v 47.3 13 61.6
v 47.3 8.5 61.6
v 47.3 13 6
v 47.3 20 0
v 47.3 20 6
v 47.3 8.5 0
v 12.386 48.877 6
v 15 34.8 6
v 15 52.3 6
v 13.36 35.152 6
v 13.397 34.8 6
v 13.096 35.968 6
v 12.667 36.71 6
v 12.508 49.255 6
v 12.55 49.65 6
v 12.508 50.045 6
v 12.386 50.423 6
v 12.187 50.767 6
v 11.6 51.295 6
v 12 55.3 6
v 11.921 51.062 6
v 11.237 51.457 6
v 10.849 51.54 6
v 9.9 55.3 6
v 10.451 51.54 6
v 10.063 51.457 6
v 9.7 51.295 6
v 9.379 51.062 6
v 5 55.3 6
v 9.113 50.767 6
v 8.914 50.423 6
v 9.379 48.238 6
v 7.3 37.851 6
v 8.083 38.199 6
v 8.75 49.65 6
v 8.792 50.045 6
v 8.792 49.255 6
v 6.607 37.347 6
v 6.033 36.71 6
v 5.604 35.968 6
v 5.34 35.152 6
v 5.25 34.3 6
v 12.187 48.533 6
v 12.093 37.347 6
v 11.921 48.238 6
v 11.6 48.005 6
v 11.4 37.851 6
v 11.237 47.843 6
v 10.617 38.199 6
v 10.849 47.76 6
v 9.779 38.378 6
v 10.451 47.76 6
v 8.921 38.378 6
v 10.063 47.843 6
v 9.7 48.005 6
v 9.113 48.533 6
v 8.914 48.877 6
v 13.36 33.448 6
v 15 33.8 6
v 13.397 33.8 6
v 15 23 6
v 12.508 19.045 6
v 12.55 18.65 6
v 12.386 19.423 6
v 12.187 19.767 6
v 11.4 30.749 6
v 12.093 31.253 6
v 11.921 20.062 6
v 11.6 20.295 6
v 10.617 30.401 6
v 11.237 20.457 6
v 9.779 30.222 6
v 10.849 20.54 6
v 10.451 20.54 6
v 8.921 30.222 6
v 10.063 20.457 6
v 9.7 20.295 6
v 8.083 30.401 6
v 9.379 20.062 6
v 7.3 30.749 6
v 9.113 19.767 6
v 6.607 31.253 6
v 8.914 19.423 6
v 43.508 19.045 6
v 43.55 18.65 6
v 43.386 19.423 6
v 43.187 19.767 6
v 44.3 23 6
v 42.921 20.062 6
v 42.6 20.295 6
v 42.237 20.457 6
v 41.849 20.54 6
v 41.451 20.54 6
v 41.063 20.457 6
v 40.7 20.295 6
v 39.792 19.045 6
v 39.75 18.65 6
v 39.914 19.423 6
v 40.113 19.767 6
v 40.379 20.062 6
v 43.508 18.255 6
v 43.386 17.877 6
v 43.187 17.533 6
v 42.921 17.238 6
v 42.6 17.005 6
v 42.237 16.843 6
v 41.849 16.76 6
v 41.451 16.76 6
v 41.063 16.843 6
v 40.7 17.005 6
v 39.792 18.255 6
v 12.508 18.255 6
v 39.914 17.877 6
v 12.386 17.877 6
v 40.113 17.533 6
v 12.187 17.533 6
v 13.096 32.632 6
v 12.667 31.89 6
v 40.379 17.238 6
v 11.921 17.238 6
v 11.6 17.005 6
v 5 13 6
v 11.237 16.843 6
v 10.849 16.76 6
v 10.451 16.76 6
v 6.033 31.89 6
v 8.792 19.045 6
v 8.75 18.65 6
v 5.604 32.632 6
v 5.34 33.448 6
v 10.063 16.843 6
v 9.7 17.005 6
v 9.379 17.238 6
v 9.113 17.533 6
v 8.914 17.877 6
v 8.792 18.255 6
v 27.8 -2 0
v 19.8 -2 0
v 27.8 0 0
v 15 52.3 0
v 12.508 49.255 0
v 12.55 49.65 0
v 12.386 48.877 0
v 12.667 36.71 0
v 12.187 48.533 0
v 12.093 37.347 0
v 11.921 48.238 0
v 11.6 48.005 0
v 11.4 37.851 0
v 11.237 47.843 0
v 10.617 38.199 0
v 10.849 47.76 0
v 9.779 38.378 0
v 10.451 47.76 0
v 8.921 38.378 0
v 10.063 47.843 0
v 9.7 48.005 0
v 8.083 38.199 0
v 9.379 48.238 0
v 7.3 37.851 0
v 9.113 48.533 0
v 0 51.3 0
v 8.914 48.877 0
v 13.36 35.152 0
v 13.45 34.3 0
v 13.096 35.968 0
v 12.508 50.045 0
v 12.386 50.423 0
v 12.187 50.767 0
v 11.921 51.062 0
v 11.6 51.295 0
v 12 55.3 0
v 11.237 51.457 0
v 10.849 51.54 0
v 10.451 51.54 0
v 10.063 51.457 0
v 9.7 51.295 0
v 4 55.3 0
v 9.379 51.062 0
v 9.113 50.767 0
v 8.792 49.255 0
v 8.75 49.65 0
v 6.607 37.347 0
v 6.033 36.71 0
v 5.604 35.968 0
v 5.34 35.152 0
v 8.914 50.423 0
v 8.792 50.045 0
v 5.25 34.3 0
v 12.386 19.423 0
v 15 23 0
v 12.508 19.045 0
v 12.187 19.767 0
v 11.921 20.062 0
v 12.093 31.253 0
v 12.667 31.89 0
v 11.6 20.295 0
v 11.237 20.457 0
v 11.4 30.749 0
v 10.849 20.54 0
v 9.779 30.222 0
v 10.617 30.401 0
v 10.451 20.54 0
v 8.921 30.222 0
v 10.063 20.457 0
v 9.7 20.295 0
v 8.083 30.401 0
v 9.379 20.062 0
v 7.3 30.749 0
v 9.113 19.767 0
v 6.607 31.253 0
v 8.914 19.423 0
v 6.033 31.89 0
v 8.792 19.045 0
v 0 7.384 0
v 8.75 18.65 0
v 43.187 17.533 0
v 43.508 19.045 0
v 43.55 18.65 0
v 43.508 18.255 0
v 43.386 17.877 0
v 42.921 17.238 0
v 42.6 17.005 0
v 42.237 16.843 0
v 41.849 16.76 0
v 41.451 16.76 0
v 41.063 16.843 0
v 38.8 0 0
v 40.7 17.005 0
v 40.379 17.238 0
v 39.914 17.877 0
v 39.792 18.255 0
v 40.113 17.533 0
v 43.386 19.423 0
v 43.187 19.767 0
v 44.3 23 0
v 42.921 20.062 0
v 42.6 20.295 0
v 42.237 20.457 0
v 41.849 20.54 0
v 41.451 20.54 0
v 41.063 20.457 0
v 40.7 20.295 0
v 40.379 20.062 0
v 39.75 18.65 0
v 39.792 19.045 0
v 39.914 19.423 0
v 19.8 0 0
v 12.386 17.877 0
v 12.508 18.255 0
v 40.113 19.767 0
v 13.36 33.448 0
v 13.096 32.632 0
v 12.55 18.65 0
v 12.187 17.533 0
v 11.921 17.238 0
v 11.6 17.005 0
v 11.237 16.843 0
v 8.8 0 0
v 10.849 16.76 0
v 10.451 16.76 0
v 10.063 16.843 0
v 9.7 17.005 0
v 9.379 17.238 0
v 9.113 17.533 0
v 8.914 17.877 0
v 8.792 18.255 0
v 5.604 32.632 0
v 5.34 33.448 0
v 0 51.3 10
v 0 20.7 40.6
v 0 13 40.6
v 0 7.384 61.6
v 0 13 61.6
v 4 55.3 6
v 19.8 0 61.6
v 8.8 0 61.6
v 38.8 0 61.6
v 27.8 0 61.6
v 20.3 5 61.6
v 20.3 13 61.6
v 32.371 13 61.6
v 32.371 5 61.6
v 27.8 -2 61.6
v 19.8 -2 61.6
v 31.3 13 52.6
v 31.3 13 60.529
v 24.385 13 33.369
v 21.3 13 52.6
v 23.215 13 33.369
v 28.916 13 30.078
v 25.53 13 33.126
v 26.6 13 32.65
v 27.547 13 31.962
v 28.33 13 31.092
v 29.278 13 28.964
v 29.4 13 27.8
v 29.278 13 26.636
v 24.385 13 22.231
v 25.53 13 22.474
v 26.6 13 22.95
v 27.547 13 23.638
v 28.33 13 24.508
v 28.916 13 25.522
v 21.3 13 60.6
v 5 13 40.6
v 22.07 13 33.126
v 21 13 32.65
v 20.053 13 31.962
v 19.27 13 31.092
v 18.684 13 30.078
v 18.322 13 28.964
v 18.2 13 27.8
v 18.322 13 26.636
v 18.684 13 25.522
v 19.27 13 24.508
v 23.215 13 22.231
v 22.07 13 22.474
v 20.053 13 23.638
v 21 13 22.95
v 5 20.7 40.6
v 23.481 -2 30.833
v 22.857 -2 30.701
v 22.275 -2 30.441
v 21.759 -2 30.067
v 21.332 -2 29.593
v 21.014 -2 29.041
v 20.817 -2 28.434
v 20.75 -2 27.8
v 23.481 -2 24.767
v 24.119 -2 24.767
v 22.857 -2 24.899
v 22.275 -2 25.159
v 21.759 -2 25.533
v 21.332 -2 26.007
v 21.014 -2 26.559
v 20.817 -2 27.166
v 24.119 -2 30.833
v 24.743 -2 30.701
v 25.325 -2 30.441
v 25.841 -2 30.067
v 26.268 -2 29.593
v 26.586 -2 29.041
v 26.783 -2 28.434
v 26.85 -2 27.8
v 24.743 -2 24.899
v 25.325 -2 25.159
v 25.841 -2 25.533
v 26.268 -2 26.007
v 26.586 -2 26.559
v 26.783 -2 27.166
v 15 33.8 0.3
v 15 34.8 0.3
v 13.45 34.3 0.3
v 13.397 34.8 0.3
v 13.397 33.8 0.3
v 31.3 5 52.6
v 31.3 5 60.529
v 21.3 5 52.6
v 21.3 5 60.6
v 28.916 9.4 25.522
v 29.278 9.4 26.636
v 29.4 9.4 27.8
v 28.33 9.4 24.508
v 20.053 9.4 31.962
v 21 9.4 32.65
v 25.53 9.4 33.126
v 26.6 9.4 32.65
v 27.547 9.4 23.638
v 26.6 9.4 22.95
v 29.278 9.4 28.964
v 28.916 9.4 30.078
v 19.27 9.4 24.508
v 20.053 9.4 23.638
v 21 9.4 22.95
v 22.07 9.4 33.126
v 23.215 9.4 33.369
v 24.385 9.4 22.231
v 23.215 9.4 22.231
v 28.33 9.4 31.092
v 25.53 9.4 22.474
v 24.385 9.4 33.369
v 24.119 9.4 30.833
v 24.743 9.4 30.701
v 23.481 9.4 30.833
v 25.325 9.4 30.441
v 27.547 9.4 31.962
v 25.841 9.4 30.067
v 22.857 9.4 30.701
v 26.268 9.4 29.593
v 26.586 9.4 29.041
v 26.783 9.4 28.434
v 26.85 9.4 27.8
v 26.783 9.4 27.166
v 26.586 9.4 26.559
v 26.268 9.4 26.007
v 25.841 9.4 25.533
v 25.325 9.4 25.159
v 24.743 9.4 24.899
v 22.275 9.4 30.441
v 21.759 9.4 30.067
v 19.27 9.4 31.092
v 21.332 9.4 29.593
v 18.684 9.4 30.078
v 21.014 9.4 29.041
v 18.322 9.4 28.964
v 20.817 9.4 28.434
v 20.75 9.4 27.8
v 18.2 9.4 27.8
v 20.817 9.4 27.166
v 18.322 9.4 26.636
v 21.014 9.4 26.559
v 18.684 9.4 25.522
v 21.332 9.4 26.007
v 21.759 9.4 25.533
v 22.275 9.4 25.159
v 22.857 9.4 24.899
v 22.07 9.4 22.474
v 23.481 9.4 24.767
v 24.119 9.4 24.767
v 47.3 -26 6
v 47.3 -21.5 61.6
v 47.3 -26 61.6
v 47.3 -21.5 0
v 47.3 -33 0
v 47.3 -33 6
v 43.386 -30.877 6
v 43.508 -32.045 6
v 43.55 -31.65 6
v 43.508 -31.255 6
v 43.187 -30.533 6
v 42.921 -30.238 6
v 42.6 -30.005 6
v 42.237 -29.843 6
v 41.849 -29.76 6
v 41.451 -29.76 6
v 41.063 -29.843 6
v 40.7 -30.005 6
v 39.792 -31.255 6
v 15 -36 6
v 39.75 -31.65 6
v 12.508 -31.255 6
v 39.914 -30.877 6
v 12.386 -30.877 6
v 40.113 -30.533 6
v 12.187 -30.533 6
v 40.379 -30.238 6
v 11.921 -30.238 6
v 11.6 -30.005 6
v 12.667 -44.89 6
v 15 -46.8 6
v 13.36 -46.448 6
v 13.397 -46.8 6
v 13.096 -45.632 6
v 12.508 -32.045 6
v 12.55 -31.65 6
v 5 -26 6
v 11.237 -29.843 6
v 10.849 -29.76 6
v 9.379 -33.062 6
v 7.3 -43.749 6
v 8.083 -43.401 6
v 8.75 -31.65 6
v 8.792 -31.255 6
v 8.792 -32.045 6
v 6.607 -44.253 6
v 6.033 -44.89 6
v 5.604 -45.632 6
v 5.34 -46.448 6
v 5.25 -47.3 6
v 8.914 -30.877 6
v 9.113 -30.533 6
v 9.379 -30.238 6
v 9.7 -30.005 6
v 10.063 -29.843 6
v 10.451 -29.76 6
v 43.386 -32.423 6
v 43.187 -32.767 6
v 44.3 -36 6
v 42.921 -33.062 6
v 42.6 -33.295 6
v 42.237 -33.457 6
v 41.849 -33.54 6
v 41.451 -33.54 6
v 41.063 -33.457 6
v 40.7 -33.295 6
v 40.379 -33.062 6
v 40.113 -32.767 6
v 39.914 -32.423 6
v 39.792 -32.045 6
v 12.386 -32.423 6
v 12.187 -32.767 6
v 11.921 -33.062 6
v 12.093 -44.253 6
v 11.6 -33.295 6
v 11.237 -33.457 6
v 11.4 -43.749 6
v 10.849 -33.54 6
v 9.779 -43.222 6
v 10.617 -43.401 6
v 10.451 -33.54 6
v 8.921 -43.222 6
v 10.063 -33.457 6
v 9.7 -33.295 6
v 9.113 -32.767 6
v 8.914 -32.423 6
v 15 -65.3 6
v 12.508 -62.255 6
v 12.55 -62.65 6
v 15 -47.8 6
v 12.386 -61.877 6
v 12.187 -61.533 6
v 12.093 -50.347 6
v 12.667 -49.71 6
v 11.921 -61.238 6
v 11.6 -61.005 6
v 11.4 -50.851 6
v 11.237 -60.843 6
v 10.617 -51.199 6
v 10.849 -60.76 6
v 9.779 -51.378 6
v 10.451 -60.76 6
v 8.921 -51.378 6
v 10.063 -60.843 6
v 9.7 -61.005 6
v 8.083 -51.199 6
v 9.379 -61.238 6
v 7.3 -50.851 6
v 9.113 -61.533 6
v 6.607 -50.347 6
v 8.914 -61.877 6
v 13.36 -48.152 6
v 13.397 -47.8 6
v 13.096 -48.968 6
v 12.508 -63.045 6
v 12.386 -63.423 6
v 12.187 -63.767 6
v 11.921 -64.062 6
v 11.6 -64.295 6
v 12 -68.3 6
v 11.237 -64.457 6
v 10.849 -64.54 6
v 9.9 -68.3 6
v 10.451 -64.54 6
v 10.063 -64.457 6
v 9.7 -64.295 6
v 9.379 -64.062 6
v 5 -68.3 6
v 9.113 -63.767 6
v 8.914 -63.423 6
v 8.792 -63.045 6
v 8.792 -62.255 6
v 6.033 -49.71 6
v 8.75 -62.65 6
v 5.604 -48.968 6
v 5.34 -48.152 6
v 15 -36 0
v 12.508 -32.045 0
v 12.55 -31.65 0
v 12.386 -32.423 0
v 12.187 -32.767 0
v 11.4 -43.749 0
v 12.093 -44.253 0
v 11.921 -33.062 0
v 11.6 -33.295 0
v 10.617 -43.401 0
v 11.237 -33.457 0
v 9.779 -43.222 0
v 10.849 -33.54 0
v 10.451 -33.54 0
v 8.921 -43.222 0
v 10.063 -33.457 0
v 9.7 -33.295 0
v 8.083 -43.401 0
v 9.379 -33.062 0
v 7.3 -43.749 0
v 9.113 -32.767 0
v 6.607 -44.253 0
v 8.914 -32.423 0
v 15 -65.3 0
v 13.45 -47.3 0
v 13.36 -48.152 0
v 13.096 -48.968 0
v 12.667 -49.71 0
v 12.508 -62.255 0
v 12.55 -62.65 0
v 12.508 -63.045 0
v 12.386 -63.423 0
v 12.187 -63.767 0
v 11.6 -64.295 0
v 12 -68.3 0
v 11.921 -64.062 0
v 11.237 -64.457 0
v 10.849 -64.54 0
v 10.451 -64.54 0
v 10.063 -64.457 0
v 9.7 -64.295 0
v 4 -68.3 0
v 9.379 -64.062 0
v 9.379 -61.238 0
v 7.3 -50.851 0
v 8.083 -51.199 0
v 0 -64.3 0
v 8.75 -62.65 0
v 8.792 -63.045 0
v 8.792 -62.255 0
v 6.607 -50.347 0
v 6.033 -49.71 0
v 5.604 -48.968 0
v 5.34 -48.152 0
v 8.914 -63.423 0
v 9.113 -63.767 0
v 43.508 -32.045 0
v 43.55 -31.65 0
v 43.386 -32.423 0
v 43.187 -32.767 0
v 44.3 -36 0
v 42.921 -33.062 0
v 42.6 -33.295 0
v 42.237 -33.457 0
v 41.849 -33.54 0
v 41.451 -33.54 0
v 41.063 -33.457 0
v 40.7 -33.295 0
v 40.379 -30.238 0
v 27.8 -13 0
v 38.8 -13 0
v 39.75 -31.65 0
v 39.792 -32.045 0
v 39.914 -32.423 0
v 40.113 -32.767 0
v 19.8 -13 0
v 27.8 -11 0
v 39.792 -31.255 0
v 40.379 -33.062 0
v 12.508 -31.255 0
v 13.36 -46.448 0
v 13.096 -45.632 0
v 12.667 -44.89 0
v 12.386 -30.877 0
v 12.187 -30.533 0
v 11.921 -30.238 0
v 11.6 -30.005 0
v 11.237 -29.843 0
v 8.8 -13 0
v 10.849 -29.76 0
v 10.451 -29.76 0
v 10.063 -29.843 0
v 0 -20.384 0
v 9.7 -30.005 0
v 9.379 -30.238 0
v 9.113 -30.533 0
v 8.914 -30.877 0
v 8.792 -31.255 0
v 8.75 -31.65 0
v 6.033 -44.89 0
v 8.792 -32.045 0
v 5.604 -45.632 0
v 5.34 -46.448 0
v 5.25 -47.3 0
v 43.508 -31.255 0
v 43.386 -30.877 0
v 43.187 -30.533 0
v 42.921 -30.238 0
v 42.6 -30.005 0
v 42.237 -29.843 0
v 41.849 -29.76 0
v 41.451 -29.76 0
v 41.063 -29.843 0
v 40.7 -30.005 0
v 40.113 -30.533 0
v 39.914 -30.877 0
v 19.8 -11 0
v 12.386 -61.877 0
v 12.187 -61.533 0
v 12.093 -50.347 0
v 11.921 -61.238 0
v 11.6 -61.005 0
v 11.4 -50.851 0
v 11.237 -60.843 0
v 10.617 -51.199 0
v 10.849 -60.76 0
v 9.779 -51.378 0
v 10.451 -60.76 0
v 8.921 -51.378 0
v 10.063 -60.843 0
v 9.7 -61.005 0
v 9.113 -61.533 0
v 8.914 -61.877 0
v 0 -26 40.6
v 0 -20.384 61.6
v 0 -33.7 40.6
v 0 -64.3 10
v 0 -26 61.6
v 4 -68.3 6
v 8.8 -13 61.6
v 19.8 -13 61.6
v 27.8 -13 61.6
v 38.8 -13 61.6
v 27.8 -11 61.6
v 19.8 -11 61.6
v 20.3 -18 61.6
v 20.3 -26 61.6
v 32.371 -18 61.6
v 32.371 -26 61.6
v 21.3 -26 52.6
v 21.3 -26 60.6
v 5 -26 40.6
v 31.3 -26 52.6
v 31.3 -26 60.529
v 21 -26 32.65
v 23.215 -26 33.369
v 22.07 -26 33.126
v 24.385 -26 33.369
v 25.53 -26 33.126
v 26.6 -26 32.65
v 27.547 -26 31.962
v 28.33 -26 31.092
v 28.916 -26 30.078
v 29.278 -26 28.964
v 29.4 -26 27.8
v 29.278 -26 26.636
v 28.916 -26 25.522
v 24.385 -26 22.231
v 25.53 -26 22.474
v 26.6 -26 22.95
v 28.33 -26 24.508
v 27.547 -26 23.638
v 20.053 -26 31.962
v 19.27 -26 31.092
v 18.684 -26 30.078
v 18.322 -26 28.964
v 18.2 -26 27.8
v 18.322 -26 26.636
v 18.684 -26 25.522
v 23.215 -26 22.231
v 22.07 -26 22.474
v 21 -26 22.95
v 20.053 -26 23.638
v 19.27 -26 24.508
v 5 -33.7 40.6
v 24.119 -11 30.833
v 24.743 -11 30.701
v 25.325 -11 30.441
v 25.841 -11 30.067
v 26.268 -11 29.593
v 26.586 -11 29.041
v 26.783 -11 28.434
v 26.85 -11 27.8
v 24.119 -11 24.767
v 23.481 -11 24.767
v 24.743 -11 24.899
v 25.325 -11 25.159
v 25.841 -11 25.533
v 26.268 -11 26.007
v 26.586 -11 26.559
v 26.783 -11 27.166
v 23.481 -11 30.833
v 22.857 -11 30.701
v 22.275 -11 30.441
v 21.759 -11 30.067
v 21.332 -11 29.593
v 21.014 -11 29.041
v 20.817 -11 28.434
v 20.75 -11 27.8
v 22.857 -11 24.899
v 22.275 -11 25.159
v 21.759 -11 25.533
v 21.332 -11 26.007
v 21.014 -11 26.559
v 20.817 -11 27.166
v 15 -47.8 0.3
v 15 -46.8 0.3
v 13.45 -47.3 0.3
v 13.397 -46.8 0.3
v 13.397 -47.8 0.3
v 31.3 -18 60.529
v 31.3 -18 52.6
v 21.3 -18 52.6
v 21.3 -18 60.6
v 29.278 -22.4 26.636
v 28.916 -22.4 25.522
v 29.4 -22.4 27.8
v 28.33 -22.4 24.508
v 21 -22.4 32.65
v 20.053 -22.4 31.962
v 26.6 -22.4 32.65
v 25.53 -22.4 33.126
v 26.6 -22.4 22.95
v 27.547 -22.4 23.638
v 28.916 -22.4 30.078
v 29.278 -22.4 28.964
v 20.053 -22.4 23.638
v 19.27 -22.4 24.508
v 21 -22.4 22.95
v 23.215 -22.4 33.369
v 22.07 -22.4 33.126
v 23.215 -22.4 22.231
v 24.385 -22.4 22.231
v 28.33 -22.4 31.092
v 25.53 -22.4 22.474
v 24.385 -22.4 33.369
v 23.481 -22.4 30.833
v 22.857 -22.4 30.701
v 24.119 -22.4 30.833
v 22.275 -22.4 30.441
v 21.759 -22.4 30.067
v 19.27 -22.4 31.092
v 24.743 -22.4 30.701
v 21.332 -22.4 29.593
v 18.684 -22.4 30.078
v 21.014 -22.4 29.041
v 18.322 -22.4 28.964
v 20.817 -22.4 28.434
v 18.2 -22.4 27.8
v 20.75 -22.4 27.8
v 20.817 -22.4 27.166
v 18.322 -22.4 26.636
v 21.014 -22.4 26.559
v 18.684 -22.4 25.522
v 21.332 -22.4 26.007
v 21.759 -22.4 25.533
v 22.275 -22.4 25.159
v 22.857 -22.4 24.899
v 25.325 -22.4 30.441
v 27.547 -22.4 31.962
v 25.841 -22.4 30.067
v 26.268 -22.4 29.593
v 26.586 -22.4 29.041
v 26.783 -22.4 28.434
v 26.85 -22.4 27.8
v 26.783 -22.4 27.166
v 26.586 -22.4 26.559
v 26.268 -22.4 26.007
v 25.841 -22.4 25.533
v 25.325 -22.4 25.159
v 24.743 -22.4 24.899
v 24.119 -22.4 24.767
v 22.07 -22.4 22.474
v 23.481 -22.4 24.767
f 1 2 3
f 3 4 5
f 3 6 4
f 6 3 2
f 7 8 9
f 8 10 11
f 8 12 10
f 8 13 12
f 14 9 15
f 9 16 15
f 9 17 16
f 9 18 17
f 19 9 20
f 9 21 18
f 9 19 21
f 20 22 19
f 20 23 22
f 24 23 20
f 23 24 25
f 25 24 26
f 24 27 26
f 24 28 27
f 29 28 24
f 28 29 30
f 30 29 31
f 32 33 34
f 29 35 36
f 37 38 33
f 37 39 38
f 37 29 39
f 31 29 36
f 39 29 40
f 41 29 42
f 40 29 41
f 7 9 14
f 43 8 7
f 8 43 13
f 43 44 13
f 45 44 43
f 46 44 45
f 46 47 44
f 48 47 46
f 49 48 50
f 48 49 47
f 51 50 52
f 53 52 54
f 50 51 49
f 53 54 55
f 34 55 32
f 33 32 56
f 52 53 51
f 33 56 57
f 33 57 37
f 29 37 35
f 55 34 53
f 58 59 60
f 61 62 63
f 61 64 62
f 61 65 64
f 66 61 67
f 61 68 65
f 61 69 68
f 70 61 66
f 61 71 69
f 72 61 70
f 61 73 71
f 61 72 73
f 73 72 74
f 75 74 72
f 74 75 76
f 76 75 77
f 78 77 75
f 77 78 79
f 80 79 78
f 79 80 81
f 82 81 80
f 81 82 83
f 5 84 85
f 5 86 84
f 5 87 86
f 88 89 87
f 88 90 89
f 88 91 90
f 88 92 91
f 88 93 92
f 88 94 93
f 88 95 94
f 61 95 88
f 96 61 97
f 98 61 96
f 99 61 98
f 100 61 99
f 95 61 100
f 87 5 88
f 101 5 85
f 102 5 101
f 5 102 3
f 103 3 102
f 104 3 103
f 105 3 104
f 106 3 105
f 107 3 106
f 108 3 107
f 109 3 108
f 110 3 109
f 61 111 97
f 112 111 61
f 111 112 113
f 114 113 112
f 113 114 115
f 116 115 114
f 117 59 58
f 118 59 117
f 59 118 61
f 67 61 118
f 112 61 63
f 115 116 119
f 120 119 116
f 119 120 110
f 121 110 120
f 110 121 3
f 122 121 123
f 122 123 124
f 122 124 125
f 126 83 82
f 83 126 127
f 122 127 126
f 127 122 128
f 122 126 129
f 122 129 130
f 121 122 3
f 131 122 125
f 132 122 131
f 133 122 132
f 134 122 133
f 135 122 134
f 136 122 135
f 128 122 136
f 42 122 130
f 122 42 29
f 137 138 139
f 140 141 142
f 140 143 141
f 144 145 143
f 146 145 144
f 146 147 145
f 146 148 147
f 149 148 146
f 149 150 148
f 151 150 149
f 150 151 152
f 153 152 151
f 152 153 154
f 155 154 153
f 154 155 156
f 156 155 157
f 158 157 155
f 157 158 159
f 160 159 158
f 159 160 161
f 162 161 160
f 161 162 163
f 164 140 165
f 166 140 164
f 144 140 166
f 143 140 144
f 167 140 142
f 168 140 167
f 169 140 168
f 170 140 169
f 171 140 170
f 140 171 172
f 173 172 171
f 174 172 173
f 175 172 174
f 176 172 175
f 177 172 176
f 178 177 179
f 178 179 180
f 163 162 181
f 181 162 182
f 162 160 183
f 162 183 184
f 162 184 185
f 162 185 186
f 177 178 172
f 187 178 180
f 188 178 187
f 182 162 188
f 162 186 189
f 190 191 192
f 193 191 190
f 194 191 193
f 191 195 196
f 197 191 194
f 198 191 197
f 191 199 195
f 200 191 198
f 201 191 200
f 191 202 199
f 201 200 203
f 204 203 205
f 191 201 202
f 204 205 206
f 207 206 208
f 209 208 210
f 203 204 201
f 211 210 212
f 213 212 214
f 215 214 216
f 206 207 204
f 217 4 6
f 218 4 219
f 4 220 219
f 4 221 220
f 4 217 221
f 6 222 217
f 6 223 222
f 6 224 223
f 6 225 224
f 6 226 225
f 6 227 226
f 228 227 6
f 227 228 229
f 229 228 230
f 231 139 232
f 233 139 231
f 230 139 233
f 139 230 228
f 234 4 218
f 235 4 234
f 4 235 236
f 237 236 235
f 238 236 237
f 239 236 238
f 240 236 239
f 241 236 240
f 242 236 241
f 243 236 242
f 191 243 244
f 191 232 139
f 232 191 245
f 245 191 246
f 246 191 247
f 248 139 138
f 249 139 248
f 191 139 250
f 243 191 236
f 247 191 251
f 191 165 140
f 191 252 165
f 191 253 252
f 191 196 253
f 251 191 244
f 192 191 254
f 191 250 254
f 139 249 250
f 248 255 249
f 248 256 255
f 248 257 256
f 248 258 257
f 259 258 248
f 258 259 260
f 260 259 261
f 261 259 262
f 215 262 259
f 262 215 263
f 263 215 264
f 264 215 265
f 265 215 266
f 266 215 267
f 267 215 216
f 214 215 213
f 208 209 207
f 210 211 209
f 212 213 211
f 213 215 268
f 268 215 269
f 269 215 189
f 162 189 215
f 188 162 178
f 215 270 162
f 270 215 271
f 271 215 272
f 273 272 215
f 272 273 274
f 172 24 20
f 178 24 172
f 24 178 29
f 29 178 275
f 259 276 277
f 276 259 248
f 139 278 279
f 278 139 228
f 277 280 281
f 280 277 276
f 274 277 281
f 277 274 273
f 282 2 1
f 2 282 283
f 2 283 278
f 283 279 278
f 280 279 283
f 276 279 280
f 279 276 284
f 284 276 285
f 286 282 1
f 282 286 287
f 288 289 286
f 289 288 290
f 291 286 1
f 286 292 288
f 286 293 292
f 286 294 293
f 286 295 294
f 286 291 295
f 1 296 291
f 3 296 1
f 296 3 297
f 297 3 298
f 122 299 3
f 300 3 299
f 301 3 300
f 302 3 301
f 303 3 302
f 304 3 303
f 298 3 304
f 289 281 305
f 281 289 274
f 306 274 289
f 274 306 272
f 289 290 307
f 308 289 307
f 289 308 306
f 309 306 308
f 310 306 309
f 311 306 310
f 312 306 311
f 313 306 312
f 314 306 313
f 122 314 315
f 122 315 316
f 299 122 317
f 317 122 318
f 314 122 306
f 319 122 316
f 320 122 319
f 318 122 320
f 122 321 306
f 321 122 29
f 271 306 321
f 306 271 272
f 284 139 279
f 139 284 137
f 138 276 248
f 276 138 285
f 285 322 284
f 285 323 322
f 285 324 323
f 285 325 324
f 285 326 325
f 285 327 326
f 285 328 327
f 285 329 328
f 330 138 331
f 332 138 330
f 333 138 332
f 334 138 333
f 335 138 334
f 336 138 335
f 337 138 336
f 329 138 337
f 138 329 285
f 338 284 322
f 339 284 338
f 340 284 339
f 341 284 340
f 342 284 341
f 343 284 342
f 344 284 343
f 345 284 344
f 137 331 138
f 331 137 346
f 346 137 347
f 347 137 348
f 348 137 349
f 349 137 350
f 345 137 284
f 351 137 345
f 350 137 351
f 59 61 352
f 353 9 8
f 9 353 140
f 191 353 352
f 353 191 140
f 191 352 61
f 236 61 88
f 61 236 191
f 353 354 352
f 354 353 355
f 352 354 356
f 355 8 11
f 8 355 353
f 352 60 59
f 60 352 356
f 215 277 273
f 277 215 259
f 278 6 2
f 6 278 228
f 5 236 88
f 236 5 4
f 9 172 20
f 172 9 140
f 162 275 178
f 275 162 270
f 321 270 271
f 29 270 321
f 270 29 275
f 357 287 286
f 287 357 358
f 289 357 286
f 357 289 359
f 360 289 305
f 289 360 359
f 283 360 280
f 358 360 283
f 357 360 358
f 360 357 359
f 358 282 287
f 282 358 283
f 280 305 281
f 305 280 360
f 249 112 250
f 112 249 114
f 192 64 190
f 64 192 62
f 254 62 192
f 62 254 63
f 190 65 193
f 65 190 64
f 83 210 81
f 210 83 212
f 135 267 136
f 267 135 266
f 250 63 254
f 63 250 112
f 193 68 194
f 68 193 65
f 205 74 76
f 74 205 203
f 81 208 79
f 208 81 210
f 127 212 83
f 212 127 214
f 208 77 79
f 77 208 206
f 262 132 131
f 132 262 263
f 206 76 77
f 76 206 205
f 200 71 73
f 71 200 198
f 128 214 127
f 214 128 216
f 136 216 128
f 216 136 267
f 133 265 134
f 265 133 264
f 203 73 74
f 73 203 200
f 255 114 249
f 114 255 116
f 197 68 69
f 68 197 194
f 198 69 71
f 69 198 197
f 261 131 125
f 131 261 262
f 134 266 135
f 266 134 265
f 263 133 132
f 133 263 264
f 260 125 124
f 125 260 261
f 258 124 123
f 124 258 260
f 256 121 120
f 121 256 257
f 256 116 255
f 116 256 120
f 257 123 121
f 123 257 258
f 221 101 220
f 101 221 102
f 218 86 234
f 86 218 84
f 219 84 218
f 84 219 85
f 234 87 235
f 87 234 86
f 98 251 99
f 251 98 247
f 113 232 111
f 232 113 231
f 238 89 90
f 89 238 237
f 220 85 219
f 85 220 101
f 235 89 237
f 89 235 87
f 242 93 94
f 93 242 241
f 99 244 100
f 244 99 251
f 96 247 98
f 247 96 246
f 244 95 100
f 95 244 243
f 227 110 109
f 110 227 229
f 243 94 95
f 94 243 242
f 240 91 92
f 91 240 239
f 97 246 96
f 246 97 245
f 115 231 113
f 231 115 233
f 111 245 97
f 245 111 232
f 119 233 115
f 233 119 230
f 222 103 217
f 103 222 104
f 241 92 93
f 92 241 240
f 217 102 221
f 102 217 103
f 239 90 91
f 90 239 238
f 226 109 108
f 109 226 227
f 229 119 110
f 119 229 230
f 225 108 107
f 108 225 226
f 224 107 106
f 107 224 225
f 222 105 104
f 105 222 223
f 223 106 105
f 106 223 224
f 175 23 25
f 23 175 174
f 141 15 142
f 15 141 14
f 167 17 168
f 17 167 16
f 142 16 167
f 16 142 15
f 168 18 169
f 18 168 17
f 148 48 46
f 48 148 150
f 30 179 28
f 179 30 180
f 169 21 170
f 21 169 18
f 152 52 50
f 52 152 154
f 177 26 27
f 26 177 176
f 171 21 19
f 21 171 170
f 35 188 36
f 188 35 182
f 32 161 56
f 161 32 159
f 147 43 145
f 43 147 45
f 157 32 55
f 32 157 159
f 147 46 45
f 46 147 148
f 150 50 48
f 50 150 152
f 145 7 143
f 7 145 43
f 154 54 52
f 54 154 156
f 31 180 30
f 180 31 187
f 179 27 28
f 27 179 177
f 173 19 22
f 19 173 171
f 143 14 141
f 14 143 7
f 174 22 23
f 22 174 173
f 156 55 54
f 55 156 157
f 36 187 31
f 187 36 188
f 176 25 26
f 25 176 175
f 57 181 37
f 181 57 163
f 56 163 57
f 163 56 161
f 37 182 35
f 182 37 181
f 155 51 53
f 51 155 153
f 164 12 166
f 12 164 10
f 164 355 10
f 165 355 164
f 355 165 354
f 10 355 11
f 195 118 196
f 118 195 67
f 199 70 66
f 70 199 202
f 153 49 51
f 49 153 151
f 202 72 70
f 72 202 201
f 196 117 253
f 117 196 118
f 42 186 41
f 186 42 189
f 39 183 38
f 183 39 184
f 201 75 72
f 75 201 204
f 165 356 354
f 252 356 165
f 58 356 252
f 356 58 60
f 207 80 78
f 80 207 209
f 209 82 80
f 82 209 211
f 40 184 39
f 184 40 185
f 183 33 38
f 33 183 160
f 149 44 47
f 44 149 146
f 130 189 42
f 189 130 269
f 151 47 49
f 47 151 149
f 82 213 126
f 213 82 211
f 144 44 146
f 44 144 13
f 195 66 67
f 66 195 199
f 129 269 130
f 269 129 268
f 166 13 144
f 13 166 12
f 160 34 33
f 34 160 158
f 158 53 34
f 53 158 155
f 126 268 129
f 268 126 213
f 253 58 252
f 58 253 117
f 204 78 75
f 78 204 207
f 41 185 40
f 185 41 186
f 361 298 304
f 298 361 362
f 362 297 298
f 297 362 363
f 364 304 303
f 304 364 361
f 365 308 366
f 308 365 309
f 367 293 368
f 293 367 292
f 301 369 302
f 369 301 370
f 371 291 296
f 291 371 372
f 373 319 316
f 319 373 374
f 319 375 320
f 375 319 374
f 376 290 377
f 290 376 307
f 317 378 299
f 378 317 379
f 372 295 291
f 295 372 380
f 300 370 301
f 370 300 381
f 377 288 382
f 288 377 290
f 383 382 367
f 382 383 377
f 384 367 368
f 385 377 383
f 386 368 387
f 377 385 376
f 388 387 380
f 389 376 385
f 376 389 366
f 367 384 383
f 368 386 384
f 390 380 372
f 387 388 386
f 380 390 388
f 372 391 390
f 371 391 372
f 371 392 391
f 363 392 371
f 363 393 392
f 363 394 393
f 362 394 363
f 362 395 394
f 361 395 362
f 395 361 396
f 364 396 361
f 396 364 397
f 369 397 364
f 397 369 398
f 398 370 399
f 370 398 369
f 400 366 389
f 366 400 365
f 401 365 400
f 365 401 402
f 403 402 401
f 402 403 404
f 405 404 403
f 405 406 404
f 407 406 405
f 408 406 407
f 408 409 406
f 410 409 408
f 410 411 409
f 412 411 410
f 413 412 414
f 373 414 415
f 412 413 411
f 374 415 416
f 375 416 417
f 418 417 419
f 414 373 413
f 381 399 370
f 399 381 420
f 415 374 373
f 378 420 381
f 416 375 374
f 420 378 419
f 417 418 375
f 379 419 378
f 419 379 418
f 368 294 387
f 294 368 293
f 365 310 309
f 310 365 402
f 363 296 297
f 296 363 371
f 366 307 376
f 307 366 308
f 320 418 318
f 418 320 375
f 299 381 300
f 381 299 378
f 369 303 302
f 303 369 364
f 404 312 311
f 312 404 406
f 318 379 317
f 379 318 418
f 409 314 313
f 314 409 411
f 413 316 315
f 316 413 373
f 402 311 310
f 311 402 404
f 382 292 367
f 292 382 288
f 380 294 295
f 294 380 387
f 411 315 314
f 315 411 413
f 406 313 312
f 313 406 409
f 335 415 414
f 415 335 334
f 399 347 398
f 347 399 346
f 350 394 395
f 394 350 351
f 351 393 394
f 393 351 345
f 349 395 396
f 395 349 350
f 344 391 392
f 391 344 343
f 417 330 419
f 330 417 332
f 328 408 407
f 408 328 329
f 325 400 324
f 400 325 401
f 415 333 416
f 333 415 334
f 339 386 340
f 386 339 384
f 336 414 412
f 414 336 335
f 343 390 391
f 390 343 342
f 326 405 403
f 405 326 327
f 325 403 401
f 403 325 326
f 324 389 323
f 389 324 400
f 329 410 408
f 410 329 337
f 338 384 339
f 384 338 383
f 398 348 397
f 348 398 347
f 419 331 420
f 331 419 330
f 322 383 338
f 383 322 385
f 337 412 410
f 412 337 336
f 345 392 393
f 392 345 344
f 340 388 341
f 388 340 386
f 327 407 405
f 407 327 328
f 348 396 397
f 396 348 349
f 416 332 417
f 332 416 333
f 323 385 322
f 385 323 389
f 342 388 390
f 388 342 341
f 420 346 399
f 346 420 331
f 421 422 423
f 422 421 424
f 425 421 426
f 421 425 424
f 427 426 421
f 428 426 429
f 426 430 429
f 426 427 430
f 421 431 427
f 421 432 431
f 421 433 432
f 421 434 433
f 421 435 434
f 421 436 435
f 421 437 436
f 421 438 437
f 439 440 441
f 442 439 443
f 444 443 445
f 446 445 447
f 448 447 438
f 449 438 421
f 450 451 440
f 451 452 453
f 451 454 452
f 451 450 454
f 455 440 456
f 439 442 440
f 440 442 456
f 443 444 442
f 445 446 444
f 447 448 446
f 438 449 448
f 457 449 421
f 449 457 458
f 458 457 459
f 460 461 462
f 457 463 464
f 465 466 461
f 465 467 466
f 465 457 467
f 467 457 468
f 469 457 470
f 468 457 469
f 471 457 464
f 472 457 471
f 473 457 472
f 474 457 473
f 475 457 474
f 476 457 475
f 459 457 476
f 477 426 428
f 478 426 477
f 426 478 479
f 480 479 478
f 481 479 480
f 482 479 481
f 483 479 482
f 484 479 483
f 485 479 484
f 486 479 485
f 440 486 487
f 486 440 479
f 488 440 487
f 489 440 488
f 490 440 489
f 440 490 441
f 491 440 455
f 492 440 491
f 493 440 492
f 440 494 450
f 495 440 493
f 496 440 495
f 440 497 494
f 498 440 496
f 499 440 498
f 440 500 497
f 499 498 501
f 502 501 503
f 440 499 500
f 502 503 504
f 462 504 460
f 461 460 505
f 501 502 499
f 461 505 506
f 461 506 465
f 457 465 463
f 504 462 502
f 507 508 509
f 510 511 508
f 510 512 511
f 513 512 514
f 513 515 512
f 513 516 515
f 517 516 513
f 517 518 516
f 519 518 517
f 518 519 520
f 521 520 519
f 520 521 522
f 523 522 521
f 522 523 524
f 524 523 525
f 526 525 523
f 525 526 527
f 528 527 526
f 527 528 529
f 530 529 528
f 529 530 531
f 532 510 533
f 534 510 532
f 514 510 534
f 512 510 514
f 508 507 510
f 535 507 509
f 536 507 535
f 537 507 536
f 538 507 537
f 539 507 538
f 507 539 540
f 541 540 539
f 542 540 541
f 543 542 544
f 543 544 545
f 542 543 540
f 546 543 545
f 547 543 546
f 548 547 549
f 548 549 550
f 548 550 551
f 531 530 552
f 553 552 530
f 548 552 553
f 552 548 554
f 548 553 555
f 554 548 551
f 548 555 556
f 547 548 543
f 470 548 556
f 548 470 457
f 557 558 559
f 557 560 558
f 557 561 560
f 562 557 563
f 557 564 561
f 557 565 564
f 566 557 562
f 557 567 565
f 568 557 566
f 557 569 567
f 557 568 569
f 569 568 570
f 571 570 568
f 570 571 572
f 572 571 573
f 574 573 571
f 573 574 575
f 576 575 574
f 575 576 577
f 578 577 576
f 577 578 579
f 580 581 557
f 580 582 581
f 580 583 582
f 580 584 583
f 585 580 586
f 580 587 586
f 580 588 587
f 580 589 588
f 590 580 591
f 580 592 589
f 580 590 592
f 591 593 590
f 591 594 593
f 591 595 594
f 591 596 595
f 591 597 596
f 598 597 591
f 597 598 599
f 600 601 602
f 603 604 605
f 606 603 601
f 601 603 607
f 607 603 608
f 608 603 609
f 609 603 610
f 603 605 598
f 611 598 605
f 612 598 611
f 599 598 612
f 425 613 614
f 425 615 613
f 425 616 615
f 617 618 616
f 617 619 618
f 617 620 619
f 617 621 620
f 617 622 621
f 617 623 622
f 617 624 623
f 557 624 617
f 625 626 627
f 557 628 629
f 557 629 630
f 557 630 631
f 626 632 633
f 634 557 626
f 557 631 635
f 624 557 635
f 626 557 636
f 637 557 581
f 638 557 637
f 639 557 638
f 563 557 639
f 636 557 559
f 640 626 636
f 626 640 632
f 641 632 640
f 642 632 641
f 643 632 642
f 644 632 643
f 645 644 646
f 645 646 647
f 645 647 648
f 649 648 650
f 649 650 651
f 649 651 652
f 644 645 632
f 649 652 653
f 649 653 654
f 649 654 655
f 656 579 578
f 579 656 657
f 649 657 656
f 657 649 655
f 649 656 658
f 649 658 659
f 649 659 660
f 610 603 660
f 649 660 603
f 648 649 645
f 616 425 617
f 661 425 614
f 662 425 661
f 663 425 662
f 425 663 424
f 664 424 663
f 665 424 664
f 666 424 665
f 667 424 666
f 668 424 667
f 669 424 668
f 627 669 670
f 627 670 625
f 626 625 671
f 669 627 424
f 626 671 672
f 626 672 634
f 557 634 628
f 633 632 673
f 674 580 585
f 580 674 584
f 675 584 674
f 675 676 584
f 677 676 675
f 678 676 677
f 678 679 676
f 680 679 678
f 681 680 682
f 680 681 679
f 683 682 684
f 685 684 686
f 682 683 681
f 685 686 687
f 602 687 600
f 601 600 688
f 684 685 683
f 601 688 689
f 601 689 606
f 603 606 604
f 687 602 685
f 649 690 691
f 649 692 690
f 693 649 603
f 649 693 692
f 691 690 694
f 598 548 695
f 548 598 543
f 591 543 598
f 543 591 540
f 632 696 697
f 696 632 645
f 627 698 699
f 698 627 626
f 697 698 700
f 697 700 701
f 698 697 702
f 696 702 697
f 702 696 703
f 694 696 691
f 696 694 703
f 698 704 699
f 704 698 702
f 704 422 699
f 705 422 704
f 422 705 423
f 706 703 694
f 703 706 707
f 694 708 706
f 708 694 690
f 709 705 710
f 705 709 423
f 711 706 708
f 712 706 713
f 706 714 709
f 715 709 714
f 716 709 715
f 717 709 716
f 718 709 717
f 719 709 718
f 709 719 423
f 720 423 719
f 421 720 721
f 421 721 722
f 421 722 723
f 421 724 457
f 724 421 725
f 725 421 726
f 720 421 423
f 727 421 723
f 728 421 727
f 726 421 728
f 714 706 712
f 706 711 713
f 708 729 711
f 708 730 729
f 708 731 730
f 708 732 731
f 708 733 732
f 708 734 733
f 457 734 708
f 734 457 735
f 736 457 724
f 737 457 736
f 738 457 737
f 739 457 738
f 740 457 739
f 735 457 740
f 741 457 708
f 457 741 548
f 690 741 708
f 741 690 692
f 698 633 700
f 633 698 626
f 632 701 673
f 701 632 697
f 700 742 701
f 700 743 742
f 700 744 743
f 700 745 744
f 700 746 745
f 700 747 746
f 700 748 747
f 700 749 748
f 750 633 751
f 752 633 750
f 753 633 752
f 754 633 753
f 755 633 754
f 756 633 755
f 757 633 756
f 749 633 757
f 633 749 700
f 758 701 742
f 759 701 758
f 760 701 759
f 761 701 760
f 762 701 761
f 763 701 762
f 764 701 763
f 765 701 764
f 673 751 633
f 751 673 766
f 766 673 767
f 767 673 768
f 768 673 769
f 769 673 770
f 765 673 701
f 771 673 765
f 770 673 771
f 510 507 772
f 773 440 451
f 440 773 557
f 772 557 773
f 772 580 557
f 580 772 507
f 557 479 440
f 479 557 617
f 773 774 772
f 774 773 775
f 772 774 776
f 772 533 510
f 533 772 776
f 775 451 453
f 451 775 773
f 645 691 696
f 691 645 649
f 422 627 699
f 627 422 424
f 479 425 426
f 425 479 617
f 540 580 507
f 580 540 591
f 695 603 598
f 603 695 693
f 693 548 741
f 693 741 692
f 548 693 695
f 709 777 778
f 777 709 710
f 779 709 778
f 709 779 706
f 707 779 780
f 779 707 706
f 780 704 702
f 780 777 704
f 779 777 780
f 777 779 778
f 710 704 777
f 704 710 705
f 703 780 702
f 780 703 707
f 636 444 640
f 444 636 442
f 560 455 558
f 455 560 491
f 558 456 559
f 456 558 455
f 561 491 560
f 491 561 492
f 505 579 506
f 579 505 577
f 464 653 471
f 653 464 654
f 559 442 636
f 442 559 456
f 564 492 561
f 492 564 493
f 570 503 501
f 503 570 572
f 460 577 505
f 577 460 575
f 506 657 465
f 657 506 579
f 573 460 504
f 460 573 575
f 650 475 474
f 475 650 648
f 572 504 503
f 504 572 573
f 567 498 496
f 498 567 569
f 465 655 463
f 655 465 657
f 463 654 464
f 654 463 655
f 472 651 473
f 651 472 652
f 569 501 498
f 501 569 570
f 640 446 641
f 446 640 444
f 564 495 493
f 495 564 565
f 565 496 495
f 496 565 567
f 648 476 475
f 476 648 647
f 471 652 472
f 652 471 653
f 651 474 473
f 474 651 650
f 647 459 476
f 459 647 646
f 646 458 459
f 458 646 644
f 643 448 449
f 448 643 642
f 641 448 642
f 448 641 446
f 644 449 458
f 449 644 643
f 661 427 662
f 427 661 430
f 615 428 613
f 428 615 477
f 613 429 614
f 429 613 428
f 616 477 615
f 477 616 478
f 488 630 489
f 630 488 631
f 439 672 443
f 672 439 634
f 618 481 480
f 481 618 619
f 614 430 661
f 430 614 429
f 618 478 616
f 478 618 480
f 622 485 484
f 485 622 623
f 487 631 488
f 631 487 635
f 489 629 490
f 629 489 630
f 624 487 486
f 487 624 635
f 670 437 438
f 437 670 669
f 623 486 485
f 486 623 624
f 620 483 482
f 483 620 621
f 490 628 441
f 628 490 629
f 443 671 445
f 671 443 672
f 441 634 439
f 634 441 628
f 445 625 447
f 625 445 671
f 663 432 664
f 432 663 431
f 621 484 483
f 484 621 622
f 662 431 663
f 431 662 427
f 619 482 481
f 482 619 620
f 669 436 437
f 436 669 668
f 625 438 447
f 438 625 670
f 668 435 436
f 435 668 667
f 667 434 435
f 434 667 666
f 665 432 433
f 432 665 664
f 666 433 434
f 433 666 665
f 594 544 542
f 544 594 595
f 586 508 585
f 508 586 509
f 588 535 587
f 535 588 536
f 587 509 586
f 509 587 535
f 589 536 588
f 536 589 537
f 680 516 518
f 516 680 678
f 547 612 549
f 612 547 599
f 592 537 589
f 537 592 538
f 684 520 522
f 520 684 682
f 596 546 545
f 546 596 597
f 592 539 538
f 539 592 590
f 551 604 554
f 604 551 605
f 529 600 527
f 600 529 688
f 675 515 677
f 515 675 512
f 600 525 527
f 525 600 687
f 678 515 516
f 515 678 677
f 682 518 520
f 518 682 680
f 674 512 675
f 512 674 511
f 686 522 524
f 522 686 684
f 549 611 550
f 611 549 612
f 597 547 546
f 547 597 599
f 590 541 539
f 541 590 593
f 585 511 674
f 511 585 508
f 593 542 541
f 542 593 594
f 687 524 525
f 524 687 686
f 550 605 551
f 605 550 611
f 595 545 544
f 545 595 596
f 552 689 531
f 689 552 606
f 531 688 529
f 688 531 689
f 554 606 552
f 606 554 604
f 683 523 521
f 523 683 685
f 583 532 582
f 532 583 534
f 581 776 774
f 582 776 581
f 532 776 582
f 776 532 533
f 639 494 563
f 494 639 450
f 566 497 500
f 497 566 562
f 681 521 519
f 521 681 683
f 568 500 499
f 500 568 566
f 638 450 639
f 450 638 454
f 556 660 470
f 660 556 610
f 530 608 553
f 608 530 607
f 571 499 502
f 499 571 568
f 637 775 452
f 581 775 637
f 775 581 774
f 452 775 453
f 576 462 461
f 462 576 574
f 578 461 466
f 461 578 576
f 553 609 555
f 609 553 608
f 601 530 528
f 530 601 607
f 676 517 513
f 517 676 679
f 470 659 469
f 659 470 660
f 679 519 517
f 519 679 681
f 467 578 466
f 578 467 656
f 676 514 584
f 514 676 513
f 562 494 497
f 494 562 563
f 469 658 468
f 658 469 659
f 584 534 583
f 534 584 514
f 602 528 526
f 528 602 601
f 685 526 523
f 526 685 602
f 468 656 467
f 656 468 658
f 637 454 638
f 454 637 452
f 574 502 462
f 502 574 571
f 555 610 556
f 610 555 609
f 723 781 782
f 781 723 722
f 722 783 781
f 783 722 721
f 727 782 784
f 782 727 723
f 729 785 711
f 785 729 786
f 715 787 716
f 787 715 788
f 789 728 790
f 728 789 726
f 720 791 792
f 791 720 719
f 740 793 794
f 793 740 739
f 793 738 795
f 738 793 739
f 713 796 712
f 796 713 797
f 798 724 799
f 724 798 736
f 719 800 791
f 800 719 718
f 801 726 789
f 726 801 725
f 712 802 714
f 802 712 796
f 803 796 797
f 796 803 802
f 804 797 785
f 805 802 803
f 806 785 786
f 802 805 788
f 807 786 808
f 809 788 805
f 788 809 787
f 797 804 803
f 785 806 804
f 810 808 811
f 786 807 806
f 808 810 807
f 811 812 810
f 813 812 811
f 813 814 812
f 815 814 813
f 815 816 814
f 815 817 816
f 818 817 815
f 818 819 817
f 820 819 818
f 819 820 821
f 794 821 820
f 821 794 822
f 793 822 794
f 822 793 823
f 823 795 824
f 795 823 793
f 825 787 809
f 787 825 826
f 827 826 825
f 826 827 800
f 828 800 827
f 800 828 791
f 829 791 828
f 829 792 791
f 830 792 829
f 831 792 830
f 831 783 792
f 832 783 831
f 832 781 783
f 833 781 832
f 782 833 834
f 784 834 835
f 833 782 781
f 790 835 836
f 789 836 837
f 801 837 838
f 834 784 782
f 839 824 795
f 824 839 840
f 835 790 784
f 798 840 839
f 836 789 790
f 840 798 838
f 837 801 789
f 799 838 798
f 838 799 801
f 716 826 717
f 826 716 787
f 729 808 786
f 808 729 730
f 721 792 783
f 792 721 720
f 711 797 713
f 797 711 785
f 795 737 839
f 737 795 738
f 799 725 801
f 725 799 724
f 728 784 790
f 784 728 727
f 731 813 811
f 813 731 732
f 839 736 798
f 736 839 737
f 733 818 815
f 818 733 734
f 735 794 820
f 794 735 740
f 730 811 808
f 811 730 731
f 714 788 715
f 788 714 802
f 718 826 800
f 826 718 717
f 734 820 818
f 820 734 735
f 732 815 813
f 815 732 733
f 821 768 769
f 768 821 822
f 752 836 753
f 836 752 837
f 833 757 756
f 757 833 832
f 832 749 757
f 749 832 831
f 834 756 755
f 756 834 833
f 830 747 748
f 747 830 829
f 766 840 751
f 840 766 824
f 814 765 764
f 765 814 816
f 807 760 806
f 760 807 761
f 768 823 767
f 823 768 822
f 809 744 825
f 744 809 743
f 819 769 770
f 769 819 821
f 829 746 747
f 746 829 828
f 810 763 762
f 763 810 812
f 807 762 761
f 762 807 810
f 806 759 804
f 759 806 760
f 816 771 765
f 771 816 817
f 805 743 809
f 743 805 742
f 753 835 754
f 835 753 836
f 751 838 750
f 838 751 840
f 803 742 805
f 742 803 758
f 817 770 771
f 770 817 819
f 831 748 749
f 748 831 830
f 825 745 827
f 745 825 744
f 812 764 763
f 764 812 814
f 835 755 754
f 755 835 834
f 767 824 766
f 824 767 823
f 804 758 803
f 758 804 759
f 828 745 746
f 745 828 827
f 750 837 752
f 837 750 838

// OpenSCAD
// file: ../configuration.scad
/*
	Konfiguracni soubor 3D tiskarny RebeliX X2
	
	Sledujte nas na:		  
			www.RepRap4U.cz
			www.facebook.com/RebeliX.cz
			https://twitter.com/reprap4u
			https://plus.google.com/+Reprap4uCz-3Dtiskarna-RebeliX
*/

/*================ Slic3r nastaveni ==========================*/

// Vyska vrstvy pro tisknuti dilu [mm]
layer_height = 0.3;

// Sirka vytlacovaneho materialu [mm]
extrusion_width = 0.66; //Slic3r->Print Settings->Advanced->Default extrusion width

/*==================== M6 sroub ==============================*/

// Rezerva prumeru hlavy sroubu [mm]
space = 1;

// Prumer hlavy M6 sroubu (pricte se rezerva) [mm]
M6_head_diameter = 10.6+space;
//M6_head_diameter = 12+space;

// Vyska hlavy M6 sroubu (dulezite pro zapusteni hlavy sroubu do plastu) [mm]
M6_head_height = 3.6;
//M6_head_height = 4.5;

// Delka sroubu M6 [mm]
// M6x12
M6_lenght = 12;

/*=================== Nastaveni dilu =========================*/

// Posun Z zakladny
z_base_offset = 11;

// Tloustka rohovych spojek
// 5 mm => sroub M6x14 s podlozkou
// 3 mm => sroub M6x12 s podlozkou
coupler_thickness = 5;

// Prumer 8mm tyce
rod_8mm_d = 8.2;

// Posun drzacku mezi x-motor a x-end
x_holder_position = 6.5;

/*======================== Motory ============================*/

// Delka motoru (ovlivni dily a delky tyci pro osy Z a Y)
//SX17-1003LQFE (doporuceno hlavne na osu Z)
//motor_length = 29.5;
//SX17-1003 (doporuceno hlavne na osu Z), SX17-0503LQEF
motor_length = 34;
//SX17-1005
//motor_length = 40;
//SX17-0905 - zde je jiz problem s velkou vyskou motoru na ose Z - musi se upravit endstop-holder
//motor_length = 48;

/*================ Remeny a remenicky ========================*/

// GT2 
belt_tooth_distance = 2;
belt_tooth_ratio = 0.5;

// T2.5
//belt_tooth_distance = 2.5;
//belt_tooth_ratio = 0.68;
// main file
// RebeliX
//
// z bottom
// GNU GPL v3
// Martin Neruda <neruda@reprap4u.cz>
// http://www.reprap4u.cz
// Inspired by Rebel II and Prusa i3


include <../configuration.scad>

// Mezera mezi motorem a soucastkou (tlumi prenaseni vibraci)
space = 0.6;

height = 55+ space;

// Hodnota musi byt stejna i v z_top (minimum 13)
base_offset = 13; 

// Posun motoru do strany
motor_offset = 0; 

module z_bottom_base(){
 translate([0,0,0]) cube([42.3+5,42.3+base_offset,6]);
 translate([0,0,0]) cube([42.3+5,base_offset,height<=34+space ? 34+space+6 : height+6]);
 translate([0,0,0]) cube([5,42.3+base_offset,(height>=34+space)||(height<=34+space) ? 34+space+6 : height+6]);
 translate([2.5+21.3-4+motor_offset,-2,0]) cube([8,3,height<=34+space ? 34+space+6 : height+6]);
}

module z_bottom_cuts(){
 translate([15,10+base_offset,-0.1]) rotate([0,0,0]) cube([50,50,10]);
 translate([7.5,21.3+base_offset-0.5,layer_height]) cube([10,1,10]); 
 
 translate([2.5+21.3-15+motor_offset,0,-0.1]) rotate([0,0,-220]) cube([30,15,height<=34+space ? 34+space+8 : height+8]);
 translate([2.5+21.3+15+motor_offset,0,-0.1]) rotate([0,0,-45]) cube([15,15,height<=34+space ? 34+space+8 : height+8]); 

 translate([42.3+6,6+base_offset,-0.1]) rotate([0,0,45]) cube([10,10,height+8]);
 translate([15,42.3+base_offset-3,-0.1]) rotate([0,0,45]) cube([10,10,height+8]);
 translate([-5,42.3+base_offset-9,-0.1]) rotate([0,0,45]) cube([20,10,height+8]);
 
 translate([-0.1,42.3+base_offset,6]) rotate([45,0,0]) cube([10,70,50]); 
 
 // Otvor pro kabely motoru 
 //translate([5+21.3-5,5,height+6-7]) cube([10,30,30]); 
 translate([5+21.3-5,5,height+6-9]) cube([10,20,30]); 
 translate([5+21.3,5,height<=34+space ? 34+space+7 : height+7]) rotate([0,45,0]) cube([5,30,5]); 
 translate([5+21.3-7,5,height<=34+space ? 34+space+7 : height+7]) rotate([0,45,0]) cube([5,30,5]);
}

module z_bottom_holes(){

 // Otvor pro hlazenou tyc 8mm
 translate([5+4.35,21.3+base_offset,-0.1]) rotate([0,0,0]) cylinder(r = 4.1, h = 20, $fn = 30);

 // Otvory pro motor
 translate([5+5.65,base_offset+5.65,-0.1]){
	translate([0,0,0]) cylinder(h = 20, r=1.9, $fn=30);
	translate([31,0,0]) cylinder(h = 20, r=1.9, $fn=30);
	translate([0,31,0]) cylinder(h = 20, r=1.9, $fn=30);
 }
 // Otvor pro prisroubovani do hlinikoveho profilu
 translate([2.5+21.3+motor_offset,base_offset-M6_head_height,height/2]) rotate([-90,0,0]) cylinder(r = M6_head_diameter/2, h = 20, $fn = 30);
 translate([2.5+21.3+motor_offset,-3,height/2]) rotate([-90,0,0]) cylinder(r = 3.05, h = 20, $fn = 30);
}

// Cela soucastka
module z_bottom(){
 difference(){
  z_bottom_base();
  z_bottom_cuts();
  z_bottom_holes();
 }
 translate([0,-13,0]) mirror([0,1,0]) difference(){
  z_bottom_base();
  z_bottom_cuts();
  z_bottom_holes();
 }
}

z_bottom();
